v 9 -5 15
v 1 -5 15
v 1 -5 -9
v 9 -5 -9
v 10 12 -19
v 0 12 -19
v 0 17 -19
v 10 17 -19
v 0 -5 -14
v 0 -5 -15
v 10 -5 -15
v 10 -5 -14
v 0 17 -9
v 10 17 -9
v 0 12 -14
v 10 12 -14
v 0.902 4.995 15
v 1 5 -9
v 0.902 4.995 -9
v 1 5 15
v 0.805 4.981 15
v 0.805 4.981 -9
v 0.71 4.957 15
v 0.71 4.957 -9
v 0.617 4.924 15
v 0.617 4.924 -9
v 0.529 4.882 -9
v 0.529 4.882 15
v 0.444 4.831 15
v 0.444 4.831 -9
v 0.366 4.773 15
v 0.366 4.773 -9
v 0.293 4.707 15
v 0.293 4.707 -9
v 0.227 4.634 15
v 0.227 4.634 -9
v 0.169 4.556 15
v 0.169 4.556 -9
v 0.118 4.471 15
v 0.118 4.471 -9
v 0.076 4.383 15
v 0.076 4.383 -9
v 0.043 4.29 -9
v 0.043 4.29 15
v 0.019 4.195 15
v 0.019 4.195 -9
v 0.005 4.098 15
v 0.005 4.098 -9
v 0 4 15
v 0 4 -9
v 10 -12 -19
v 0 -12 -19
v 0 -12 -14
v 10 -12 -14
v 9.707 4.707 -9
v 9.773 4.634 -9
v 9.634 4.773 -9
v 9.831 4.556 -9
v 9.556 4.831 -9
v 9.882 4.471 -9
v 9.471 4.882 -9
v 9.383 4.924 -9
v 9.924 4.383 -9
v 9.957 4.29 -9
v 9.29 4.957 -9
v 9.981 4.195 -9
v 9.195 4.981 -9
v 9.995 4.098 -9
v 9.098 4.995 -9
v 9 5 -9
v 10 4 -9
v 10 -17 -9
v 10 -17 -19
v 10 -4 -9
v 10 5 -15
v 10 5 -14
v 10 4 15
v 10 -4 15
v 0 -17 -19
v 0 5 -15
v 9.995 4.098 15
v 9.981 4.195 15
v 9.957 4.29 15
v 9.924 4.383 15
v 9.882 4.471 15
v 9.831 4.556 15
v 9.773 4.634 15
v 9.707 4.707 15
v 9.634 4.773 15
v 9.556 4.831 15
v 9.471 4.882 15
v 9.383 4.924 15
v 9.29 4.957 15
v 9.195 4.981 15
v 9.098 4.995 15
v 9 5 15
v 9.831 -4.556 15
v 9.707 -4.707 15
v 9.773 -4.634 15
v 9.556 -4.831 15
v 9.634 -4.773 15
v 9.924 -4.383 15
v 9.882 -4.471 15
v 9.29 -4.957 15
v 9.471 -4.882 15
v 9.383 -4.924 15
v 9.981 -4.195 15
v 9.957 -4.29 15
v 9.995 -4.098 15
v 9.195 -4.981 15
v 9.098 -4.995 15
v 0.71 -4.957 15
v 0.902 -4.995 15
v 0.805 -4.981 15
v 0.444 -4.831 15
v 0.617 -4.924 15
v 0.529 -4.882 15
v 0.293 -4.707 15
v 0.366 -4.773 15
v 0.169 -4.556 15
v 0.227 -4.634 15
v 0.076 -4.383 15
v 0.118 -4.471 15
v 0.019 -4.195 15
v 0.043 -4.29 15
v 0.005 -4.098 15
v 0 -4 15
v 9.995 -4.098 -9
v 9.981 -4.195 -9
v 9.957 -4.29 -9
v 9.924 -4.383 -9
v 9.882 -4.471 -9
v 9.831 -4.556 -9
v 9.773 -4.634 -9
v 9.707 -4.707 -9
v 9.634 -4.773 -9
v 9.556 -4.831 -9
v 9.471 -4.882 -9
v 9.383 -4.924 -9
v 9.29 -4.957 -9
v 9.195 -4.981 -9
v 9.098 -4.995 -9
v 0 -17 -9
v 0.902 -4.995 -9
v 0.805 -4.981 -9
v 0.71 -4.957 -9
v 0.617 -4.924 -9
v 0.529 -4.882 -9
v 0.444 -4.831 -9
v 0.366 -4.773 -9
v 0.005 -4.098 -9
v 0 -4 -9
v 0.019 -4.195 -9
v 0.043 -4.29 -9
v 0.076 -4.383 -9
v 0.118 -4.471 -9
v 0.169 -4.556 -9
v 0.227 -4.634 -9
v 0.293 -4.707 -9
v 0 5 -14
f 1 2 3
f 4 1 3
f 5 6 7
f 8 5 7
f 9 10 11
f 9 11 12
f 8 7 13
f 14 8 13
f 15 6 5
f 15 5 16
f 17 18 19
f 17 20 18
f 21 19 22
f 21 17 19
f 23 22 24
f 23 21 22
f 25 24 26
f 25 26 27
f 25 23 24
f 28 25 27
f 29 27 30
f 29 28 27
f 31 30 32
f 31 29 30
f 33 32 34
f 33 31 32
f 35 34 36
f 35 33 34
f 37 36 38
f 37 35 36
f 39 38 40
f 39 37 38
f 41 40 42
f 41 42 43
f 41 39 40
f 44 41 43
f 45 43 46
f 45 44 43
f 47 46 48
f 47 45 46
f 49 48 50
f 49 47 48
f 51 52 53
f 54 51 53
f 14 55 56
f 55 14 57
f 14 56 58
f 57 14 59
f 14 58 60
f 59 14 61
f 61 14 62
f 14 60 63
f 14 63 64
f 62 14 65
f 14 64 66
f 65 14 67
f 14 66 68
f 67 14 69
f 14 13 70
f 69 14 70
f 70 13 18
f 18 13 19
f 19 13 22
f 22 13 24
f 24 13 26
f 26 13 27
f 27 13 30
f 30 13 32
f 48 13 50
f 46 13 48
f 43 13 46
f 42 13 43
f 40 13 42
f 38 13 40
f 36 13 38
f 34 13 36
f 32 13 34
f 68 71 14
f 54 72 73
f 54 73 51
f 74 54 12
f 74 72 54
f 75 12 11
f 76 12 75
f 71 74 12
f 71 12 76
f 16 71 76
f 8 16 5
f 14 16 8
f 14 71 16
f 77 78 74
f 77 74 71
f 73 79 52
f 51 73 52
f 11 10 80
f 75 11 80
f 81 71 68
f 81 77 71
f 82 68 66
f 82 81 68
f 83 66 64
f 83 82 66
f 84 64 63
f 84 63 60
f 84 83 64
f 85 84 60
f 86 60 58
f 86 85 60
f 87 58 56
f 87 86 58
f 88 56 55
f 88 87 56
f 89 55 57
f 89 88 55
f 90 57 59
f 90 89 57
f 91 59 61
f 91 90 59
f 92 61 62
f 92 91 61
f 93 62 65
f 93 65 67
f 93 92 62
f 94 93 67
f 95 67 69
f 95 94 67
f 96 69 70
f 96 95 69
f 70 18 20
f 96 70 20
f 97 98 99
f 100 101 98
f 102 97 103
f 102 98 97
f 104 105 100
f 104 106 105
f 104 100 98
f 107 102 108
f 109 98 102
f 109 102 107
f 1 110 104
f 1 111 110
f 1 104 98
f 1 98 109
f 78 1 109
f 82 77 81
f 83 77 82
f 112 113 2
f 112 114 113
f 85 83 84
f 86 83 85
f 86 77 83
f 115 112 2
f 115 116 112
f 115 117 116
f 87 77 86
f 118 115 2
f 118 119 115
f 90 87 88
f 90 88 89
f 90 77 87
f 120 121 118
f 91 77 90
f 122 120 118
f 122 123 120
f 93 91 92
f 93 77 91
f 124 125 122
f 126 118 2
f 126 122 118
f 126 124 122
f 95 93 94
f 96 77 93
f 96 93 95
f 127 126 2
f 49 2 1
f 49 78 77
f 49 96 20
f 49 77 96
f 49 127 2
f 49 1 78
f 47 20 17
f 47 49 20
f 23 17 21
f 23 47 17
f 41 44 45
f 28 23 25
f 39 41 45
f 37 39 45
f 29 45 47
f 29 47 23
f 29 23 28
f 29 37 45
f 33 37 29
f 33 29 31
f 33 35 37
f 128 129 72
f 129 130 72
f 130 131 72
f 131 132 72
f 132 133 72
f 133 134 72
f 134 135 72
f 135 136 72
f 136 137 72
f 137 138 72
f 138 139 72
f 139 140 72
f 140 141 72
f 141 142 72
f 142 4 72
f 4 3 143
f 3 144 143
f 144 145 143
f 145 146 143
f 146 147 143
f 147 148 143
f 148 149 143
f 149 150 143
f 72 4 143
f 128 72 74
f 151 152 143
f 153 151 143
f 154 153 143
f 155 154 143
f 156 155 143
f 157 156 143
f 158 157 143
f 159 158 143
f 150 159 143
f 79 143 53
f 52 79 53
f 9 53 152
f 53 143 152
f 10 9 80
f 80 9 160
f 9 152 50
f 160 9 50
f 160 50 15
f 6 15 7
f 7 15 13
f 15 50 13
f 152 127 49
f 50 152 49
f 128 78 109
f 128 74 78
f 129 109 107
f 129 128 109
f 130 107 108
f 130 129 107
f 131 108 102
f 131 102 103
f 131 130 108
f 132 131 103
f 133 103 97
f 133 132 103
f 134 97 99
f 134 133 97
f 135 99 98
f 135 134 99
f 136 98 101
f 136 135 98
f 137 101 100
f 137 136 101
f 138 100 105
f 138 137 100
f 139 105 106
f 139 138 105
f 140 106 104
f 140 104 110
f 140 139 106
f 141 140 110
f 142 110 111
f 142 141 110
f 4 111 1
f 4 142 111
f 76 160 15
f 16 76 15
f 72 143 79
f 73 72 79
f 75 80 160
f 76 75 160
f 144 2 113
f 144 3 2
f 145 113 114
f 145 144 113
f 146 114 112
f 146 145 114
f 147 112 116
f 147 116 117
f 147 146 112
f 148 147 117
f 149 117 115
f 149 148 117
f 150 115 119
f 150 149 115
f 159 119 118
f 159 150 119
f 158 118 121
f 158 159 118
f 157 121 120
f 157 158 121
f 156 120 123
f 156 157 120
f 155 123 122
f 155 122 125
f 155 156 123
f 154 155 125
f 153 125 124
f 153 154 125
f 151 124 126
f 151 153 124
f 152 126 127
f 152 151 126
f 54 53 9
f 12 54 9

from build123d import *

# Parameters (mm, degrees)
F0_W     = 10
F0_H     = 24
F0_H_2   = 5
F0_W_2   = 7
F0_W_3   = 5
F0_H_3   = 1
F1_DEPTH = 10
F2_R     = 1
F3_R     = 1
F4_R     = 1
F5_R     = 1


with BuildPart() as f1:
    # F0 (on Right) → F1 (new body)
    with BuildSketch(Plane.YZ):
        with Locations((0, 3)):
            Rectangle(F0_W, F0_H)
        with Locations((0, -11.5)):
            Rectangle(F0_W, F0_H_2)
        with Locations((8.5, -11.5)):
            Rectangle(F0_W_2, F0_H_2)
        with Locations((14.5, -11.5)):
            Rectangle(F0_W_3, F0_H_2)
        with Locations((14.5, -16.5)):
            Rectangle(F0_W_3, F0_H_2)
        with Locations((-8.5, -11.5)):
            Rectangle(F0_W_2, F0_H_2)
        with Locations((-14.5, -11.5)):
            Rectangle(F0_W_3, F0_H_2)
        with Locations((-14.5, -16.5)):
            Rectangle(F0_W_3, F0_H_2)
        with Locations((0, -14.5)):
            Rectangle(F0_W, F0_H_3)
    extrude(amount=F1_DEPTH)

    # F2
    f2_edges = [f1.edges().sort_by_distance(p)[0] for p in [
        (0, 5, 3),
    ]]
    fillet(f2_edges, radius=F2_R)

    # F3
    f3_edges = [f1.edges().sort_by_distance(p)[0] for p in [
        (10, 5, 3),
    ]]
    fillet(f3_edges, radius=F3_R)

    # F4
    f4_edges = [f1.edges().sort_by_distance(p)[0] for p in [
        (0, -5, 3),
    ]]
    fillet(f4_edges, radius=F4_R)

    # F5
    f5_edges = [f1.edges().sort_by_distance(p)[0] for p in [
        (10, -5, 3),
    ]]
    fillet(f5_edges, radius=F5_R)


solid = f1.part
